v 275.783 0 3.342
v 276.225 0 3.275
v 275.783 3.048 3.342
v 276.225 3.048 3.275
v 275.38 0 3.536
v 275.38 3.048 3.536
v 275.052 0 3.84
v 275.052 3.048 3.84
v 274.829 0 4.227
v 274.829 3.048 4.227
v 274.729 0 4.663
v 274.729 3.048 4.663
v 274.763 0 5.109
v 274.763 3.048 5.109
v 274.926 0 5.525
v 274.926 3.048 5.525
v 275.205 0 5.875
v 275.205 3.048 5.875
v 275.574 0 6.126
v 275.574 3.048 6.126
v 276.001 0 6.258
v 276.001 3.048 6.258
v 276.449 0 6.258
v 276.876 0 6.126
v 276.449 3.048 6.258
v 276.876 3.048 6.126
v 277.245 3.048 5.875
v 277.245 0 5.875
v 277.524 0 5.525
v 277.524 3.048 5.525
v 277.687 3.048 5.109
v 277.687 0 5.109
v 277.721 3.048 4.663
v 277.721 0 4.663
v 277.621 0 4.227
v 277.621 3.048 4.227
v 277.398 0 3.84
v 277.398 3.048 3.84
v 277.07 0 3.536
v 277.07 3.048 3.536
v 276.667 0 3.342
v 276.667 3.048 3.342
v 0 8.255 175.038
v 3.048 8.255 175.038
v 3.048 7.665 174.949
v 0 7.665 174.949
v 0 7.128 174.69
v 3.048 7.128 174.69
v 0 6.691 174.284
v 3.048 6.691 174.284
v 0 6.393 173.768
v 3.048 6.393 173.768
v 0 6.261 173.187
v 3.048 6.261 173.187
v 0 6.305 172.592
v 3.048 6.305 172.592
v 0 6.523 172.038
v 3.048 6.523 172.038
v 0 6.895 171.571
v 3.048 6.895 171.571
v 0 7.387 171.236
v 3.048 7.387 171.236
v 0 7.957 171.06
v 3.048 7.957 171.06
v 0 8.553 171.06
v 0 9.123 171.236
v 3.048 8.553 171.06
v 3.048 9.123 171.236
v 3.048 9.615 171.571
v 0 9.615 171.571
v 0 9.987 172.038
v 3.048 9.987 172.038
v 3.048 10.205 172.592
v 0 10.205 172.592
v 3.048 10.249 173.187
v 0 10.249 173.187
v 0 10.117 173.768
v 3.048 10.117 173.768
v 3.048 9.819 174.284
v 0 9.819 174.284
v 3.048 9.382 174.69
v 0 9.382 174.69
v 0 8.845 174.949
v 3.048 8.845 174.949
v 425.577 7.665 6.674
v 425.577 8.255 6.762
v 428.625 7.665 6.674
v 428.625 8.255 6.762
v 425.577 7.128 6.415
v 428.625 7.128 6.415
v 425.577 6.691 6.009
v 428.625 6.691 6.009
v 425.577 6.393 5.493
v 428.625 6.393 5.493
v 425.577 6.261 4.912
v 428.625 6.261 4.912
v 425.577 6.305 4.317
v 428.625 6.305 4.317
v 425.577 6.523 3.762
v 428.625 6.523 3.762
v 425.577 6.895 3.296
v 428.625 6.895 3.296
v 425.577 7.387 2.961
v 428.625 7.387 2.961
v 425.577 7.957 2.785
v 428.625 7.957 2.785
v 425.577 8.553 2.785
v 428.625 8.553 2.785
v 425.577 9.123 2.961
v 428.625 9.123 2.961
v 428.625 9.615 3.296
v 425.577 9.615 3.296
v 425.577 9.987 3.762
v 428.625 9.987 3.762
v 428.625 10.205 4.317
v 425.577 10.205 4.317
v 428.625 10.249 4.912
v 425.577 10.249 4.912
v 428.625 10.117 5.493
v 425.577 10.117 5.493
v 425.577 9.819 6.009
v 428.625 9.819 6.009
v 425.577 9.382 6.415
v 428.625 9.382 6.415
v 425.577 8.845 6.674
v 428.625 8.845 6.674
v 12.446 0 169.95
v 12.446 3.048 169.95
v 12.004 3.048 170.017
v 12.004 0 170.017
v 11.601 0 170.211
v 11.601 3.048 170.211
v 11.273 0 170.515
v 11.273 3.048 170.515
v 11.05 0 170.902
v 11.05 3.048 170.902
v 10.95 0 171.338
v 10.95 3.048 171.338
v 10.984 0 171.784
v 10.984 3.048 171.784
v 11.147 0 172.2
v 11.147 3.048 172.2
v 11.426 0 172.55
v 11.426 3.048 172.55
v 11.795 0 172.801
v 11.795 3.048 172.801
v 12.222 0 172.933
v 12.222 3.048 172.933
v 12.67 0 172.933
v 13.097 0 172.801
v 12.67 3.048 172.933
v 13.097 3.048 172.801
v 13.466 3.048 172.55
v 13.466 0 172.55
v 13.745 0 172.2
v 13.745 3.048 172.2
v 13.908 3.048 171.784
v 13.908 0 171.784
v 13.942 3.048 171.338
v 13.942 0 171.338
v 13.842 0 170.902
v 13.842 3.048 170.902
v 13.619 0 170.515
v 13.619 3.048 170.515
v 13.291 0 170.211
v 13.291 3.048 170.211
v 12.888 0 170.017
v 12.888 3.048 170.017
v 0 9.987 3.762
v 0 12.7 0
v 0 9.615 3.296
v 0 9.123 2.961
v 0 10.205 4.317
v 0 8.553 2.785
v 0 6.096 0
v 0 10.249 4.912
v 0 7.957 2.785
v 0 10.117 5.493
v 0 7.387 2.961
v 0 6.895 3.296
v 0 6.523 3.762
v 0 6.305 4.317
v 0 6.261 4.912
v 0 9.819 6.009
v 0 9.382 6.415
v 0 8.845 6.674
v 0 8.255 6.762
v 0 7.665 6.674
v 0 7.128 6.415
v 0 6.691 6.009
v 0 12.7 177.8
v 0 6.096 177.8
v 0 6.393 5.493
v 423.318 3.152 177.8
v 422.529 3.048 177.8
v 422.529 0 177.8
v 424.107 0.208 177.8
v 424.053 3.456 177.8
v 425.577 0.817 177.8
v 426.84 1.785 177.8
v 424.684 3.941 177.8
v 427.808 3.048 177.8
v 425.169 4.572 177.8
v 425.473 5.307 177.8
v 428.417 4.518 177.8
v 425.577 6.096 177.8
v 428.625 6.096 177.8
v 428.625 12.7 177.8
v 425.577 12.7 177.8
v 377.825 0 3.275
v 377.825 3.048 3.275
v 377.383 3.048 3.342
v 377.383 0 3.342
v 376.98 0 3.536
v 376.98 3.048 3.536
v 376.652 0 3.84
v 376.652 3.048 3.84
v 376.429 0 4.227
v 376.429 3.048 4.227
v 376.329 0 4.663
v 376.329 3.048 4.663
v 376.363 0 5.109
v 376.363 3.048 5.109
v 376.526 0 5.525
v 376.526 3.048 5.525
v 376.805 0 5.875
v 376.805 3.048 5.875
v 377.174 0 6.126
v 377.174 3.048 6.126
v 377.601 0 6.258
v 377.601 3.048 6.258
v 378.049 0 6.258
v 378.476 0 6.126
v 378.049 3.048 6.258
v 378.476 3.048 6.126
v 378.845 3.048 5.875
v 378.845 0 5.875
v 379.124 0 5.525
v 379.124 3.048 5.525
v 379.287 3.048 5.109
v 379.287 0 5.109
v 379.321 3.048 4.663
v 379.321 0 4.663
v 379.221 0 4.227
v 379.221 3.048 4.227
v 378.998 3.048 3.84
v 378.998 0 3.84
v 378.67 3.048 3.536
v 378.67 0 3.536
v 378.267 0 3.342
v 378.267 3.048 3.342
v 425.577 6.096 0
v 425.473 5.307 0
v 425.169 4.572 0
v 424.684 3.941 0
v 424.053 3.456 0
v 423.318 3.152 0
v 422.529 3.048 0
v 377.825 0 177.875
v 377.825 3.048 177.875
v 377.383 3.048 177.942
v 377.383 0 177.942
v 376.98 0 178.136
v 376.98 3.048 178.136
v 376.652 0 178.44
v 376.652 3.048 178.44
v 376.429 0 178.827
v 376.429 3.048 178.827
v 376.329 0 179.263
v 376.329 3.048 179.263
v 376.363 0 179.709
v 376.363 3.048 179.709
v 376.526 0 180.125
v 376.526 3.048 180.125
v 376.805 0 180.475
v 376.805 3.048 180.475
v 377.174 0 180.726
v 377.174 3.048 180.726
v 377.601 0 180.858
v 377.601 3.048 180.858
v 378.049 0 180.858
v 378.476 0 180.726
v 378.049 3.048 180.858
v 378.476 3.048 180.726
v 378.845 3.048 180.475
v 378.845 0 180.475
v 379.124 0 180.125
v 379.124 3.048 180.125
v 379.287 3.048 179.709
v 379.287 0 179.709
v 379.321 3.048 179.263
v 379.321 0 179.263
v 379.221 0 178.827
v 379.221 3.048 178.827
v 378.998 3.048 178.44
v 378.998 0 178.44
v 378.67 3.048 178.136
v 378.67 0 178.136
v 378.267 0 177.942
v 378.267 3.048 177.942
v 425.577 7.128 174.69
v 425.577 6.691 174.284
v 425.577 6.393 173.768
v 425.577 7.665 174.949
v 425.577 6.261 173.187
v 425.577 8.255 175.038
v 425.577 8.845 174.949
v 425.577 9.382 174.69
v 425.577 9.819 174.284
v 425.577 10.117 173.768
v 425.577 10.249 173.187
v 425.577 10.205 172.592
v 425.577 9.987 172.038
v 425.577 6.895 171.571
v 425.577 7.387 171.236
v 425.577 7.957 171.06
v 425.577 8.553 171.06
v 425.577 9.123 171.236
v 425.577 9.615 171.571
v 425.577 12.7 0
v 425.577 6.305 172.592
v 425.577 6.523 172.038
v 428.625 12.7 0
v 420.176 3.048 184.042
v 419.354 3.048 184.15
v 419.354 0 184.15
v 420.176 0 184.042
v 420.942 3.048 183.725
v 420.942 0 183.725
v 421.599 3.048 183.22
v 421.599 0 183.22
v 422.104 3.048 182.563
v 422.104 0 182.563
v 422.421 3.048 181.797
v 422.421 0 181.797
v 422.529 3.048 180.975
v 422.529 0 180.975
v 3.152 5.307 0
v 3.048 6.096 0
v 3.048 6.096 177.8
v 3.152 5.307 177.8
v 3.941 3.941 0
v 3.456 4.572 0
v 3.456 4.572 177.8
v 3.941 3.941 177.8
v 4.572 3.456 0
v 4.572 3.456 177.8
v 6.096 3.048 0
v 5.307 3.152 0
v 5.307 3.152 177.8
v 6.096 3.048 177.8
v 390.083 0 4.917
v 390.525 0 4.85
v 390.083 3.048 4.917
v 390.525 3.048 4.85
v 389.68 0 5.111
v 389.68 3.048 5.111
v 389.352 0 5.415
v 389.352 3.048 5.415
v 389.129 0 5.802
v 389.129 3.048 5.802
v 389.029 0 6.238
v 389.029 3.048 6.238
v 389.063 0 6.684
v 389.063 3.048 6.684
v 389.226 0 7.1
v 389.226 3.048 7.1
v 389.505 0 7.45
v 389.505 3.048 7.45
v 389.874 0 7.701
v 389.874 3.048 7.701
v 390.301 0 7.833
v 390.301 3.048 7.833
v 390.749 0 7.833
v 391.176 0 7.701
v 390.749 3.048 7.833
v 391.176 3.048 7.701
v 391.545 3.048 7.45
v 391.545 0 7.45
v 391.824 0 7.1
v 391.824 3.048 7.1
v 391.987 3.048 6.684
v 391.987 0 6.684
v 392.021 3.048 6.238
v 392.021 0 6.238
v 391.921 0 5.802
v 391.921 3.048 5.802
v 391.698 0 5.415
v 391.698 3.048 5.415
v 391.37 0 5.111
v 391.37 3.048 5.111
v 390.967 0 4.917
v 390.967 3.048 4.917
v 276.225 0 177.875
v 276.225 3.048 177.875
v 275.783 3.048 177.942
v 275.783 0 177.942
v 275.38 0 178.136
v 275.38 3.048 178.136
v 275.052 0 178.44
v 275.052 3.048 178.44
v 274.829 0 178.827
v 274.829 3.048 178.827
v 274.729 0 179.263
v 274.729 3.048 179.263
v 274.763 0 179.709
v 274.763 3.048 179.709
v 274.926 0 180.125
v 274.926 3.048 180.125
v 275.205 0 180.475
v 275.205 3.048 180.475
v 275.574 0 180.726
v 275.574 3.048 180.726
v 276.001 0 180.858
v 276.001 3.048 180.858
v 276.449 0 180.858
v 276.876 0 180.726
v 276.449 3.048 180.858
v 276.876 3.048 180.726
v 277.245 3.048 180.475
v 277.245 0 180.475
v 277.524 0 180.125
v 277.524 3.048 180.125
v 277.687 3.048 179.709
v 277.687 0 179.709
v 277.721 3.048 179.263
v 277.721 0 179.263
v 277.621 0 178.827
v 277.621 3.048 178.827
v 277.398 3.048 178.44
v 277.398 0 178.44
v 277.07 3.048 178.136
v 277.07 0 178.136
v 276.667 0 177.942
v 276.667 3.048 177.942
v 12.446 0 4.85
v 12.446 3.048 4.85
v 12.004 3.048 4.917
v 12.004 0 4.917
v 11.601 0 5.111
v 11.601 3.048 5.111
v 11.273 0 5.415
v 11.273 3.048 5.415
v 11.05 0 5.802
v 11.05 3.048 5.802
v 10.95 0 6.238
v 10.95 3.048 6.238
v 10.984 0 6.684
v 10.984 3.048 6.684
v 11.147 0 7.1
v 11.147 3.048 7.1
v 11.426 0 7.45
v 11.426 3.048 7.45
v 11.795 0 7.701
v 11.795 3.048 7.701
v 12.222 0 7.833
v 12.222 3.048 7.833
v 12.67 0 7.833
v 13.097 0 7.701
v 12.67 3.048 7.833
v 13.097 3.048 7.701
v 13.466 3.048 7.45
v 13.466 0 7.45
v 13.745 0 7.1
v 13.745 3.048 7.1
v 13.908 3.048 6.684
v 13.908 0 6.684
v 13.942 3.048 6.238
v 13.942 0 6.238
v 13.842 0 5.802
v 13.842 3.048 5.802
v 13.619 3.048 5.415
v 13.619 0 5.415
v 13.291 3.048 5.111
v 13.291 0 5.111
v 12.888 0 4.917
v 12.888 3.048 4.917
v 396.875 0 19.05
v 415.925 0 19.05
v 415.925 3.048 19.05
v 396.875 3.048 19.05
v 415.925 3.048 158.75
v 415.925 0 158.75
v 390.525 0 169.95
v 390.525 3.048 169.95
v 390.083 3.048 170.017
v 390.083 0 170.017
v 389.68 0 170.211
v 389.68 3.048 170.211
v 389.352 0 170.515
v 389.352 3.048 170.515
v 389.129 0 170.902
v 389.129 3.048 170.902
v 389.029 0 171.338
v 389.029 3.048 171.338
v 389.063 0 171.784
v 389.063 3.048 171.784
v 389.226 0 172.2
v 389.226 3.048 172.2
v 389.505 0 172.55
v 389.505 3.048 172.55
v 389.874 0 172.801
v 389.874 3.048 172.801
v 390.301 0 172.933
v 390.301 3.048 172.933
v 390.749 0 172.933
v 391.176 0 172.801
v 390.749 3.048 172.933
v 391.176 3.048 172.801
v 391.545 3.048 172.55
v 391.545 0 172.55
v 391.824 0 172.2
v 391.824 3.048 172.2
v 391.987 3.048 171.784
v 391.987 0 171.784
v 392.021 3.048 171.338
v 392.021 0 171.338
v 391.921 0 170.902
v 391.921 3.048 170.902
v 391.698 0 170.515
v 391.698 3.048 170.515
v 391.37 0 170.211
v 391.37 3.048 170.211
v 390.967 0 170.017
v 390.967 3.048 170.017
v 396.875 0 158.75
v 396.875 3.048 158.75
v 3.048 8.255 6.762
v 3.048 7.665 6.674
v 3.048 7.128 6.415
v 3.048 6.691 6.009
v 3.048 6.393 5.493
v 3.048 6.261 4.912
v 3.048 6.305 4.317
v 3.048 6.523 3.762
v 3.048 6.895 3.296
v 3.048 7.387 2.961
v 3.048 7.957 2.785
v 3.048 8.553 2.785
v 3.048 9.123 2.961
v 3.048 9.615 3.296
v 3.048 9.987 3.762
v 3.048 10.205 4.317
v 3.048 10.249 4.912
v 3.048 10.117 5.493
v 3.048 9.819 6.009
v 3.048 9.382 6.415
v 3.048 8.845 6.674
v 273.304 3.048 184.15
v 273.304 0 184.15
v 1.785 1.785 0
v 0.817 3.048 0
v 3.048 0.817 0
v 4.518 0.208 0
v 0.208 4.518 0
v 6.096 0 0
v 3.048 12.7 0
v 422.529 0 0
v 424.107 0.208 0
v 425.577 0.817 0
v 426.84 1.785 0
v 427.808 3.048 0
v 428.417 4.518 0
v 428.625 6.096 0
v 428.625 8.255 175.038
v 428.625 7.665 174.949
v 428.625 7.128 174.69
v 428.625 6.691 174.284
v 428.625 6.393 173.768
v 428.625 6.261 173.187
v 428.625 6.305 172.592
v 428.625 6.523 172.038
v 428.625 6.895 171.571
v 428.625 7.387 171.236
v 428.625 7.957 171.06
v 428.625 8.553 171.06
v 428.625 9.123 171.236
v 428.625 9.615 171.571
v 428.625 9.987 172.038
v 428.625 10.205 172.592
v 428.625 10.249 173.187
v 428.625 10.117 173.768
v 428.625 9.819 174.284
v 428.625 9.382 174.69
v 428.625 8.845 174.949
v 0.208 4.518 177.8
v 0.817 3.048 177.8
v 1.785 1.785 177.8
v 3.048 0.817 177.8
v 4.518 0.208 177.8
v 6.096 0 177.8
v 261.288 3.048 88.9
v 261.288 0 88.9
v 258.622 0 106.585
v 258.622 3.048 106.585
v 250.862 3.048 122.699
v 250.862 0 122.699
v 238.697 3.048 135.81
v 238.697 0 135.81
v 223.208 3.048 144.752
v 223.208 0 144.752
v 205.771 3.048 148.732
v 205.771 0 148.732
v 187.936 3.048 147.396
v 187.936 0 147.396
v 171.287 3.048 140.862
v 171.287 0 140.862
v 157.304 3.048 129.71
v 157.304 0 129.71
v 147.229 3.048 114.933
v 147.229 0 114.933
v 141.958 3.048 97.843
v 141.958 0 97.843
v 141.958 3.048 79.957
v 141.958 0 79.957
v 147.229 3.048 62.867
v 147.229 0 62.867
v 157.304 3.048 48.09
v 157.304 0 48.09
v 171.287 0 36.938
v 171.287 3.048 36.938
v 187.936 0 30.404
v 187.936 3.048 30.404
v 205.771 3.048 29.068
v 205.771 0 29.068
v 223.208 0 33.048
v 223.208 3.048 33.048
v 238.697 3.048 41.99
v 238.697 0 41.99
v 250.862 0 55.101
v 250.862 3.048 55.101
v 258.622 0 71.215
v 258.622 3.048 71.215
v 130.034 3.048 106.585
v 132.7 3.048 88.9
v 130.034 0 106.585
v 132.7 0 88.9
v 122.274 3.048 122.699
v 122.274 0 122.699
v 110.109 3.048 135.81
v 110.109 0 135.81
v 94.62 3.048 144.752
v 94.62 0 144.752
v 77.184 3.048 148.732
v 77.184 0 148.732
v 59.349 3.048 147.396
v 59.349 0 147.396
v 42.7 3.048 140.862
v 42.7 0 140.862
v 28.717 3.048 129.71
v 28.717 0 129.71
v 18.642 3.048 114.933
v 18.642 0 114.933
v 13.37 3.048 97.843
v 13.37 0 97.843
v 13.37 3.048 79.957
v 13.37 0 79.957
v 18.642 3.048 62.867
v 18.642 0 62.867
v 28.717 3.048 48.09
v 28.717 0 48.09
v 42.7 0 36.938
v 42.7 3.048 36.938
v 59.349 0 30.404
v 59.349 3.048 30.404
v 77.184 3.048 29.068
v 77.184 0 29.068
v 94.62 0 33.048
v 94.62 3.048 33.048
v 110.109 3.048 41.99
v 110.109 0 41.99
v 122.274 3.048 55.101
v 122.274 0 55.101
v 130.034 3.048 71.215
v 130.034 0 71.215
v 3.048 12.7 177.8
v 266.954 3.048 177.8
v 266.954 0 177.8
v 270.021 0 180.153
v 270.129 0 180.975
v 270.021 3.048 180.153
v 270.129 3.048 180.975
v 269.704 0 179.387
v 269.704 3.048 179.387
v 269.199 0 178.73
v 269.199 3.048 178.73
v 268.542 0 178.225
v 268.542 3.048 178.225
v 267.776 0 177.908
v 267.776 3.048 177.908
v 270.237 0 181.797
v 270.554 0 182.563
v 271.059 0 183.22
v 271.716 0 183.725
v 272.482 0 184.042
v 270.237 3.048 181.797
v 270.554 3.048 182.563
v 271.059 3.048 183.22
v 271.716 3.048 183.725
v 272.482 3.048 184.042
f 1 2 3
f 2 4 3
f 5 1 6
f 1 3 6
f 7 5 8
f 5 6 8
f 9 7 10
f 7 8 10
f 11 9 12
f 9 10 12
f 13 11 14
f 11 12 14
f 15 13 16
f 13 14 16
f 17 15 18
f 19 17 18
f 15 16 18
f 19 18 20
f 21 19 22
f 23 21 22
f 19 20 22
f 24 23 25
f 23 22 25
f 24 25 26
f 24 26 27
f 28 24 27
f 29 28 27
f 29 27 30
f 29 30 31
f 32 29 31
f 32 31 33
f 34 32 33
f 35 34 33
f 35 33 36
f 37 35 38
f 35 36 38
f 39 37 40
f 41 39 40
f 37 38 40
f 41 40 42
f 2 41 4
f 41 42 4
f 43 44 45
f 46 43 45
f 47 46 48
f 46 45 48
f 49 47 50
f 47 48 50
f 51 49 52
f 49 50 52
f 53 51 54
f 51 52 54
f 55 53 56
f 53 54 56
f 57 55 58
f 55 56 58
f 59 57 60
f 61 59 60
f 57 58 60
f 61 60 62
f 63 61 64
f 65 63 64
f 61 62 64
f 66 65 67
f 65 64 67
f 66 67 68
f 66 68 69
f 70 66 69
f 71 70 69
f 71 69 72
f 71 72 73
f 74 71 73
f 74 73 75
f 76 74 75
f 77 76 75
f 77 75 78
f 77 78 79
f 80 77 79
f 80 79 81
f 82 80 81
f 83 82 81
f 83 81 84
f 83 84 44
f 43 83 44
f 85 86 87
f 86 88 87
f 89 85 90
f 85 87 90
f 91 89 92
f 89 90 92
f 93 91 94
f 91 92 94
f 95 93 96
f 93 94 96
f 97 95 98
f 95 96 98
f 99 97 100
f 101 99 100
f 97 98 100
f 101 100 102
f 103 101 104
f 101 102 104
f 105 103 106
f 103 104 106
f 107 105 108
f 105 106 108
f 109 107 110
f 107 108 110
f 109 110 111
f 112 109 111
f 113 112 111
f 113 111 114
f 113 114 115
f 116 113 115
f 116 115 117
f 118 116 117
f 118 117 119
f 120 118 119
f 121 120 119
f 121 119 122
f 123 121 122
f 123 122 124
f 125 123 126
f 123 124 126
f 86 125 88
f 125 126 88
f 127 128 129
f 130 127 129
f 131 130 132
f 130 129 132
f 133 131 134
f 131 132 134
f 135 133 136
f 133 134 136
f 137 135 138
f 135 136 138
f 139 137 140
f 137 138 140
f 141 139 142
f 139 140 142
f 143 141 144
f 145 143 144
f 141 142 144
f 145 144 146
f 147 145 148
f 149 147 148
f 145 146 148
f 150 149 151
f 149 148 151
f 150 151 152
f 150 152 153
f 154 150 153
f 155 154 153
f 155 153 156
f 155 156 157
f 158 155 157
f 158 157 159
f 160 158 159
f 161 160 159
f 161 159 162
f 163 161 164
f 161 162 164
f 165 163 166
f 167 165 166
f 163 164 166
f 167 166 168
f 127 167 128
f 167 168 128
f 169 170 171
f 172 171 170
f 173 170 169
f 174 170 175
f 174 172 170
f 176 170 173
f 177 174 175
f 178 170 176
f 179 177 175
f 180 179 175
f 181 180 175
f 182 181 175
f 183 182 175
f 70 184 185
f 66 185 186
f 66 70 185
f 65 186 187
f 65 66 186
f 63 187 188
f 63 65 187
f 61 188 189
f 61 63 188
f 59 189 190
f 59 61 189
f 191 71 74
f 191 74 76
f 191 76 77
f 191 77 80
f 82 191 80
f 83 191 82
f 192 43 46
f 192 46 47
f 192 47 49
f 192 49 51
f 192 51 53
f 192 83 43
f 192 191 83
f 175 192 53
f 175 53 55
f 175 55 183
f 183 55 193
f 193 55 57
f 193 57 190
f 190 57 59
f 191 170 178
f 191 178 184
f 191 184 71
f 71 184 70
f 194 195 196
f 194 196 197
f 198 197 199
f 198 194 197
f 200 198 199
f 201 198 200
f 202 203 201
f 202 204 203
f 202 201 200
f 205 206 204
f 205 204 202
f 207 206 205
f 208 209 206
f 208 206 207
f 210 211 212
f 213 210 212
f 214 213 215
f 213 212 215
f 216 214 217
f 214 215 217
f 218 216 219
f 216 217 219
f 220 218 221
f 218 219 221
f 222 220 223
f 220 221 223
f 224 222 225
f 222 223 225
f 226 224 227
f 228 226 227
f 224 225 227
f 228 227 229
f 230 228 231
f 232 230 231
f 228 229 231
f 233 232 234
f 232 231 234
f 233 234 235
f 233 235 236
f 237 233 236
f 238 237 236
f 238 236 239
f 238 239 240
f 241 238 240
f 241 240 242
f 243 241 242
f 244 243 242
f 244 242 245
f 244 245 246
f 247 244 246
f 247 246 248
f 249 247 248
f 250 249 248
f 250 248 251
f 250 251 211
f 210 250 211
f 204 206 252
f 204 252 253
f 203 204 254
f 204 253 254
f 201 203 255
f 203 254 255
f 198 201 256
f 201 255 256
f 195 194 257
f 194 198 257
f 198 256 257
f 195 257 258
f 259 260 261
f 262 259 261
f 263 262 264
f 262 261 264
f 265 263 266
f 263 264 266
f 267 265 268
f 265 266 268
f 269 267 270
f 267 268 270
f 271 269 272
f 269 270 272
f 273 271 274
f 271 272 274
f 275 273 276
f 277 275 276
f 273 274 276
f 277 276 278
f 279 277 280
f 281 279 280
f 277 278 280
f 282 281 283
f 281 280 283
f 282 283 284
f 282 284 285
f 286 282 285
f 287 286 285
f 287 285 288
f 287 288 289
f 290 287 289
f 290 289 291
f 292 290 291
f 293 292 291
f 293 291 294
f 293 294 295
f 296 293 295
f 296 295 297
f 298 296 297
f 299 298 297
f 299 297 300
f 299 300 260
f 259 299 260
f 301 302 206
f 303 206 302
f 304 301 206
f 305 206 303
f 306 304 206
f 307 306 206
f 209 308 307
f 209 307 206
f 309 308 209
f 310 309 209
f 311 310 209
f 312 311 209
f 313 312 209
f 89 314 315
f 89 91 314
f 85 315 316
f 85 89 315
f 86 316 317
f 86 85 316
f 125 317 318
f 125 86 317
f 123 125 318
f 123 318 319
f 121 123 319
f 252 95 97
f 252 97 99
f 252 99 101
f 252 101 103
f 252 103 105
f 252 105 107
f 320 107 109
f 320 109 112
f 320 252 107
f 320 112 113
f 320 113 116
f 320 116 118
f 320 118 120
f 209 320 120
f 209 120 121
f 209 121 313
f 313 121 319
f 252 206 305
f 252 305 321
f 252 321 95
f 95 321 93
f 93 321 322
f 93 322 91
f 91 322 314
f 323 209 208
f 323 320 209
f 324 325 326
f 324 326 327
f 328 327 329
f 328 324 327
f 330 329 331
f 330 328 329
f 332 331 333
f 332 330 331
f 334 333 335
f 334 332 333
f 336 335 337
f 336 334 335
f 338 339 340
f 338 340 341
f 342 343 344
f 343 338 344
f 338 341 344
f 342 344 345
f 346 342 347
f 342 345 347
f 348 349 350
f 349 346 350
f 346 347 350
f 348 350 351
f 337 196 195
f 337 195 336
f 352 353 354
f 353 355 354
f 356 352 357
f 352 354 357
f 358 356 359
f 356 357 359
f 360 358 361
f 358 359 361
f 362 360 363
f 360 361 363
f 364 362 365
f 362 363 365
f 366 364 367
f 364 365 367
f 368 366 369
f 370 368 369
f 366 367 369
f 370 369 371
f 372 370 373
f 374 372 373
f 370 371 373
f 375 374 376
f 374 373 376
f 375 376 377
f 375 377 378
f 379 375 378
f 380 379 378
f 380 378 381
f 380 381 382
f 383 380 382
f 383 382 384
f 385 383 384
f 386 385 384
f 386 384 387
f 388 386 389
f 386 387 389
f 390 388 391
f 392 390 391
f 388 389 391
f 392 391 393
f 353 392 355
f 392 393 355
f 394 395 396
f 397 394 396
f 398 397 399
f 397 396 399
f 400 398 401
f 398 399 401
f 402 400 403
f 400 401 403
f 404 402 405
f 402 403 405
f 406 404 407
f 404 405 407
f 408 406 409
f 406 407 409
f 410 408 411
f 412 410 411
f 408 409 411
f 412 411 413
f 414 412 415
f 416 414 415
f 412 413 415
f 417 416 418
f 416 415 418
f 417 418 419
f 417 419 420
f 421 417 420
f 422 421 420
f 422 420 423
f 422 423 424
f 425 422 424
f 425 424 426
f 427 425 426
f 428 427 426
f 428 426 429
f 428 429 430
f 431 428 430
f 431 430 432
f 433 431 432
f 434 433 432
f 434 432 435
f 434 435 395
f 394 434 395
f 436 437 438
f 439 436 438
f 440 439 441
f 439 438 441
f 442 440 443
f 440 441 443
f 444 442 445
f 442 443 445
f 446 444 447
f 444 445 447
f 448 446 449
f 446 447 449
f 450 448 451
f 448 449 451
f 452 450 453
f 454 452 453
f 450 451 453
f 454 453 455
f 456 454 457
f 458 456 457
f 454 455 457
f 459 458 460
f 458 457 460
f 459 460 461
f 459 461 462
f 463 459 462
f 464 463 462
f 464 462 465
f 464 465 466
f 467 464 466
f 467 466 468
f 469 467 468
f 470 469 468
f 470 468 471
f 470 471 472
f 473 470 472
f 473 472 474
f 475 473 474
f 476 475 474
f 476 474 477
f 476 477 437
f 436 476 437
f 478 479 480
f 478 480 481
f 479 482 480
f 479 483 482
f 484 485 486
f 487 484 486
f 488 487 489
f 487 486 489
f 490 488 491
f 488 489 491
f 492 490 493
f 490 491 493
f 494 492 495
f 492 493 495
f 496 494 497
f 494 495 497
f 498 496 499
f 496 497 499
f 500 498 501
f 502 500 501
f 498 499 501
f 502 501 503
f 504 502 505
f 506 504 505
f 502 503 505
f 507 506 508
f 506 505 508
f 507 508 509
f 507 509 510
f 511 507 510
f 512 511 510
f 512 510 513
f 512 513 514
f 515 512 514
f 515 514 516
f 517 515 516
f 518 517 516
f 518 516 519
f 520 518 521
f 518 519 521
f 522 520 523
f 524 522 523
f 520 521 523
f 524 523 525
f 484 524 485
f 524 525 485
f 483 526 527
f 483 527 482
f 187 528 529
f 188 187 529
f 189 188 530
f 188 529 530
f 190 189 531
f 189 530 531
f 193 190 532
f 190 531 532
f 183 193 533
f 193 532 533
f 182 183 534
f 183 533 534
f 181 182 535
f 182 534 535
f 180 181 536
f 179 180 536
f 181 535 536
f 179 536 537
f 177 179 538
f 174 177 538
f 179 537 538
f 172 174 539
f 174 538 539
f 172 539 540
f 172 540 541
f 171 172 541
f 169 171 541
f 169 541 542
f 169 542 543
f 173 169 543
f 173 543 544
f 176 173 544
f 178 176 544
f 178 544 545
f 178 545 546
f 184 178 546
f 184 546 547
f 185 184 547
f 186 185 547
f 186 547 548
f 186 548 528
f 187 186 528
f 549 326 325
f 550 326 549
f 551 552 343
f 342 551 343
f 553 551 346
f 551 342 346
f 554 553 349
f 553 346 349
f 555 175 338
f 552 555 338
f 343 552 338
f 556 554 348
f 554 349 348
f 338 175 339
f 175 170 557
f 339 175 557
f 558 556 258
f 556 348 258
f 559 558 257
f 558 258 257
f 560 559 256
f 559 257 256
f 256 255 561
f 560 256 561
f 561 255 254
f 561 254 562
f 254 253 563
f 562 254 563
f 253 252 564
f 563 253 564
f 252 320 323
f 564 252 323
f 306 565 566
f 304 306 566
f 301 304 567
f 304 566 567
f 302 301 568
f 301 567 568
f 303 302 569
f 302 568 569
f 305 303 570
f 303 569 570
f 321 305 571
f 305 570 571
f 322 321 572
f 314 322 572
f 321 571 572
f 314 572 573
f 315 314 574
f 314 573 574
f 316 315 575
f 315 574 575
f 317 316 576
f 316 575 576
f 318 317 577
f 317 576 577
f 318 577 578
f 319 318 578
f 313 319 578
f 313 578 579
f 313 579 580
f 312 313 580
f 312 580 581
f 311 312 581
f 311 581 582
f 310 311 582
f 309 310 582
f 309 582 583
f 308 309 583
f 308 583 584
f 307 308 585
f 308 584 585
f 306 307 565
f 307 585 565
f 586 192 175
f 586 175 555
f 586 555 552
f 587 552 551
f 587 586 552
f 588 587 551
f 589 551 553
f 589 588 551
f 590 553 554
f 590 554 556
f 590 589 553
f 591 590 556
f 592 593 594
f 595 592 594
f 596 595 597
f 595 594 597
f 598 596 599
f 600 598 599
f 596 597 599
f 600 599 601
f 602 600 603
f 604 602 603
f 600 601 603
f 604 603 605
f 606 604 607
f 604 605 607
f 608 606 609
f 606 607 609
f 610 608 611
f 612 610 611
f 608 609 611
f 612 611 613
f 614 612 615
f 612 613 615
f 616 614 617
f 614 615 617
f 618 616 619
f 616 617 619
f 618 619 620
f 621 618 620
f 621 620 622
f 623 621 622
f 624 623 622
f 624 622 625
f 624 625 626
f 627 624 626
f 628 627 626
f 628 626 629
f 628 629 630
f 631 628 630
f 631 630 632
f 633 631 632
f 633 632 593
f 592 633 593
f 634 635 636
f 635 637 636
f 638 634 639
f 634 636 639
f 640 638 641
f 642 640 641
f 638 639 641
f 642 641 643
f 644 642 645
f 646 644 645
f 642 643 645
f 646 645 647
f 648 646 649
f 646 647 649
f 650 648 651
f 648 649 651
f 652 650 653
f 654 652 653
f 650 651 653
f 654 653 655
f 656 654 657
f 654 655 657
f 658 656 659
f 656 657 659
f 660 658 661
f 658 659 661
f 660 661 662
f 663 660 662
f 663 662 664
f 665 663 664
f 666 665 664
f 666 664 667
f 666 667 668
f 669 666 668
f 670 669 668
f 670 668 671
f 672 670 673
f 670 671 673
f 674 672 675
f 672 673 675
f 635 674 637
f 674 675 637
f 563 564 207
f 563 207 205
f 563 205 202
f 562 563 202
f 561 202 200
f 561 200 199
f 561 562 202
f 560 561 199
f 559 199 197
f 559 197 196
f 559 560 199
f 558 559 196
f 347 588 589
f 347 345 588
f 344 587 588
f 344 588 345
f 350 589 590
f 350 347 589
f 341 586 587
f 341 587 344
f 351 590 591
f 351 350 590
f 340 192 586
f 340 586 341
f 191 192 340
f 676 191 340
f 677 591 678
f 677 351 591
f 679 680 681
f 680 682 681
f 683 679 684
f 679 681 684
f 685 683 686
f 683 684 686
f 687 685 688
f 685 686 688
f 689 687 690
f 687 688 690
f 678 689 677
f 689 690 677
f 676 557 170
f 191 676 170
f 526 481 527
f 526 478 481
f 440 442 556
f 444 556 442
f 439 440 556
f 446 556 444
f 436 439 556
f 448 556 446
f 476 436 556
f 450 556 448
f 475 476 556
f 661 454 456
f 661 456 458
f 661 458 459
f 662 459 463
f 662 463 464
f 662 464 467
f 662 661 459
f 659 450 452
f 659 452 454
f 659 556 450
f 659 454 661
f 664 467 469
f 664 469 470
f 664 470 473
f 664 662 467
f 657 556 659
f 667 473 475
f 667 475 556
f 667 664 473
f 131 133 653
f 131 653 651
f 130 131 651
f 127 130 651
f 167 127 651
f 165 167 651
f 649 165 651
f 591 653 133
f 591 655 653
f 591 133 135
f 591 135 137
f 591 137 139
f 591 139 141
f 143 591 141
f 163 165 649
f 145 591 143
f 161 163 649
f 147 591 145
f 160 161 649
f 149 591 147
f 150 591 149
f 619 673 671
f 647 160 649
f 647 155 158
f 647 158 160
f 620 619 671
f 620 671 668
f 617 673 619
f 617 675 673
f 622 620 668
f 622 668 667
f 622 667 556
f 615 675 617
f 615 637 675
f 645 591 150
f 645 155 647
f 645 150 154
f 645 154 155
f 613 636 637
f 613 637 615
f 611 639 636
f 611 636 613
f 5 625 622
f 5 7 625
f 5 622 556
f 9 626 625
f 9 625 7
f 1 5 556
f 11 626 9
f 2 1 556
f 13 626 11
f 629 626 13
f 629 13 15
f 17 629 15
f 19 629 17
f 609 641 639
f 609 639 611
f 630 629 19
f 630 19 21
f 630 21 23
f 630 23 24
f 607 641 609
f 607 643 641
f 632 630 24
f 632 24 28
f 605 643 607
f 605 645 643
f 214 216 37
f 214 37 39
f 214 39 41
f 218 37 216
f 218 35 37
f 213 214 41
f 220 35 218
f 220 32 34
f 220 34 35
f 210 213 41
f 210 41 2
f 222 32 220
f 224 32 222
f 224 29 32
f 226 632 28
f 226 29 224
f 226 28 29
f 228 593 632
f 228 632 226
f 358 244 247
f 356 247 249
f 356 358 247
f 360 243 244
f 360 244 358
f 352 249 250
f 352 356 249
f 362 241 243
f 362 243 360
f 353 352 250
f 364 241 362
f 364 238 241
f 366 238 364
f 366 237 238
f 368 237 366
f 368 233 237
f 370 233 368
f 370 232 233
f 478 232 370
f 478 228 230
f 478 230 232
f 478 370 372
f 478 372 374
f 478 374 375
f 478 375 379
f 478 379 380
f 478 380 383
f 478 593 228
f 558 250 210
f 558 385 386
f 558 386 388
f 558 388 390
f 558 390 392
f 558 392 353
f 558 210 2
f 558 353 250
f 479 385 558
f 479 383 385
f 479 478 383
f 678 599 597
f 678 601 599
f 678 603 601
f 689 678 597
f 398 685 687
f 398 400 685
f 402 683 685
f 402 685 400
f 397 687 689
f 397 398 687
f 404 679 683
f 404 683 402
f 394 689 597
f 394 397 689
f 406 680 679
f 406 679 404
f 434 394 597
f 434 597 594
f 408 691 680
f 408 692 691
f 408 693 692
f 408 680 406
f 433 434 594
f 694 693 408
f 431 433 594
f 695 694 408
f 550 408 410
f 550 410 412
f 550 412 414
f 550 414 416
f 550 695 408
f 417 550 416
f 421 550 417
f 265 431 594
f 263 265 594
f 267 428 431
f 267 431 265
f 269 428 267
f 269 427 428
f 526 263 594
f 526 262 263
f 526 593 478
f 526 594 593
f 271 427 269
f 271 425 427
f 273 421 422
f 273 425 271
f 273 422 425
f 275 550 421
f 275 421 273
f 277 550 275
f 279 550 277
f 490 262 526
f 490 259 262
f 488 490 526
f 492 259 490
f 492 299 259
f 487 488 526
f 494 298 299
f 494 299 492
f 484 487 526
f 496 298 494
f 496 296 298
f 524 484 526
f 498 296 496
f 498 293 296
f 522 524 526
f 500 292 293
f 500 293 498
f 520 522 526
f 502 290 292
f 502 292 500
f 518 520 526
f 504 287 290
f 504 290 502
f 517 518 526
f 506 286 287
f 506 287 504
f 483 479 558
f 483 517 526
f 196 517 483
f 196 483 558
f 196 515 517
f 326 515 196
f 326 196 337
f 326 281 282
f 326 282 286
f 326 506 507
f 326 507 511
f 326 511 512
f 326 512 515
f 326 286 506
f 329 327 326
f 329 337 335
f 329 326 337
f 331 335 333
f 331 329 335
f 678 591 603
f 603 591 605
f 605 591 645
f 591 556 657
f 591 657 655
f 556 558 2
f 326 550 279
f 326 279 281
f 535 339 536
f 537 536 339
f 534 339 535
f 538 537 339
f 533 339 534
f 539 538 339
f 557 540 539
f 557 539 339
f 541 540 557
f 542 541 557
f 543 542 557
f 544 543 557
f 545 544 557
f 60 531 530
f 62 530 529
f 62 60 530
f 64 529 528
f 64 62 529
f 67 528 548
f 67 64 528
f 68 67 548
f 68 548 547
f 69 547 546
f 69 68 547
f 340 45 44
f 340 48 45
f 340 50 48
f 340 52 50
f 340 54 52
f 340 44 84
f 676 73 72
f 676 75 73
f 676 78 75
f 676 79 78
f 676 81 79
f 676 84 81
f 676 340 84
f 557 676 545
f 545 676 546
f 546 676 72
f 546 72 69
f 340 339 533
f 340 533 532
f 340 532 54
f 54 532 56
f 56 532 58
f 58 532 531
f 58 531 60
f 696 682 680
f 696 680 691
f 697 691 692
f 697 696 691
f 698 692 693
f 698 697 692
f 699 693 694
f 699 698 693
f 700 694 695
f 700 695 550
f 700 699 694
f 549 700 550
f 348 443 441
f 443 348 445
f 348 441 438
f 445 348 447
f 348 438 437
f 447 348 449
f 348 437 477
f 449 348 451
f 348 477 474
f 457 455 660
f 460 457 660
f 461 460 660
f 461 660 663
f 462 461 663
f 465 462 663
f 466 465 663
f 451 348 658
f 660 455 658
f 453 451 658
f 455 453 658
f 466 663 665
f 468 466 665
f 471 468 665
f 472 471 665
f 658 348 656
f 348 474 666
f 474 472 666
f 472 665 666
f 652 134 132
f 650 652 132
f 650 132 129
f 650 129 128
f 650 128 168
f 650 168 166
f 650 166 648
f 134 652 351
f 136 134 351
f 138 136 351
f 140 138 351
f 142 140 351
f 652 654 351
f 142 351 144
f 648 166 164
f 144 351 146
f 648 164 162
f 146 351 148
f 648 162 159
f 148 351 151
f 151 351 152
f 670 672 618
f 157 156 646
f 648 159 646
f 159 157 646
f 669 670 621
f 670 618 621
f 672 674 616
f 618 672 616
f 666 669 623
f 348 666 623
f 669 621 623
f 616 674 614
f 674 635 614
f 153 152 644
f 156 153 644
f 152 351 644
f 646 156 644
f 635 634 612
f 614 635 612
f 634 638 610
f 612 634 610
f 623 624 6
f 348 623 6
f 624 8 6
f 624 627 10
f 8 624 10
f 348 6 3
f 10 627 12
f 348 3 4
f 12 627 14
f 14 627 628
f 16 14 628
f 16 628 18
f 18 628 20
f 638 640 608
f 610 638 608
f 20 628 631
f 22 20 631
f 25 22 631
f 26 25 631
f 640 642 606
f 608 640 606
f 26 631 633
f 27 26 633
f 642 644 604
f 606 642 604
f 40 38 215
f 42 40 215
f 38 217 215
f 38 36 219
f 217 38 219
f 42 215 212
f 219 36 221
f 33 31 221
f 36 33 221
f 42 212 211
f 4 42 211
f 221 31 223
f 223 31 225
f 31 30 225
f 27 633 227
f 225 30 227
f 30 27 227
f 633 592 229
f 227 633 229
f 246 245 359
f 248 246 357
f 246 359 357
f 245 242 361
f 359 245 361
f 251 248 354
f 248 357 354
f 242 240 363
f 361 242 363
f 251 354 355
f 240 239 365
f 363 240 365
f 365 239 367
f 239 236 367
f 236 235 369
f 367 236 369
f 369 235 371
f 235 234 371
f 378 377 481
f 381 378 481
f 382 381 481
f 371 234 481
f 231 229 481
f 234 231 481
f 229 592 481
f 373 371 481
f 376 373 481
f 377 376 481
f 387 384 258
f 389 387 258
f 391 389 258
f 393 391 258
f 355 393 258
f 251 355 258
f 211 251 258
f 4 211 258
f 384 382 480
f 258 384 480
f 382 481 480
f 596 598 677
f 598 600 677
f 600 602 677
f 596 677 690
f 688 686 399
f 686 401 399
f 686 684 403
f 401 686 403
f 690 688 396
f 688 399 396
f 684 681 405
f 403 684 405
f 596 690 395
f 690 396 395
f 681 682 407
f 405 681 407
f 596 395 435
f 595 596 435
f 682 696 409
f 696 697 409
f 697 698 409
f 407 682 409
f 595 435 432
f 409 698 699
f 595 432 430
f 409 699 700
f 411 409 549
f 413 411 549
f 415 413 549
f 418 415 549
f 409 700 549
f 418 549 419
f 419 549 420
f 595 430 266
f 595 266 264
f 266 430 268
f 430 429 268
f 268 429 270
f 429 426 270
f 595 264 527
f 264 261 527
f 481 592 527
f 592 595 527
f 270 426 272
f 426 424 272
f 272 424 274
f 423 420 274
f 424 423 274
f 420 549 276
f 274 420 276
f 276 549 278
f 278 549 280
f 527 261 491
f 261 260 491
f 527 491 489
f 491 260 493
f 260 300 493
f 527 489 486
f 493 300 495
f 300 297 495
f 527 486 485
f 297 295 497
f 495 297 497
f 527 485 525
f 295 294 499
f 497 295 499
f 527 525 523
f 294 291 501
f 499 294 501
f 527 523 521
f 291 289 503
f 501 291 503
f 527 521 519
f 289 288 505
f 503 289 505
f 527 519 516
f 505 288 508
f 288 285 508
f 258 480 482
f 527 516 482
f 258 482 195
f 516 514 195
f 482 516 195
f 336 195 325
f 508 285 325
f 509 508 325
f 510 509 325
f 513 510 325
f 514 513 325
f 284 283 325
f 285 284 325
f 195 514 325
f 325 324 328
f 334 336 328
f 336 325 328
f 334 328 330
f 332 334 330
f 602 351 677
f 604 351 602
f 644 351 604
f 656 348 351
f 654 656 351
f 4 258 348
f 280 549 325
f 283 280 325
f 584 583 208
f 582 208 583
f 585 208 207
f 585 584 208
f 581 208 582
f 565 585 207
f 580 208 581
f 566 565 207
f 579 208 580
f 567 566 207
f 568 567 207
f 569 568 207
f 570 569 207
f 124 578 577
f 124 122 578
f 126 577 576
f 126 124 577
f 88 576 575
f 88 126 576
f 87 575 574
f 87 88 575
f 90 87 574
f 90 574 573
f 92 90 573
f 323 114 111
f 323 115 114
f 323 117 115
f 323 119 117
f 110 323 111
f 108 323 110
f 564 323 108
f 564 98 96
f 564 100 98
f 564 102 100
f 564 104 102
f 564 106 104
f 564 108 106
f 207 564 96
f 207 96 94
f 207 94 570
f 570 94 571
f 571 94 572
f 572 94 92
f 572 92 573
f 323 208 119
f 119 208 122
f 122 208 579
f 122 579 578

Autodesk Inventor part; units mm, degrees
ref_plane "YZ Plane" through (0, 0, 0) normal (1, 0, 0) x (0, 1, 0)
ref_plane "XZ Plane" through (0, 0, 0) normal (0, 1, 0) x (-1, 0, 0)
ref_plane "XY Plane" through (0, 0, 0) normal (0, 0, 1) x (1, 0, 0)
sketch "Sketch1" plane through (0, 0, 0) normal (0, 1, 0) x (-1, 0, 0)
  line L0 (0, 0) -> (-428.625, 0)
  line L1 (-428.625, 0) -> (-428.625, 177.8)
  line L2 (-428.625, 177.8) -> (0, 177.8)
  line L3 (0, 177.8) -> (0, 0)
  dimension "d0" = 428.625
  dimension "d1" = 177.8
extrude "Plate1" add sketch "Sketch1" along normal blind 3.048
sketch "Sketch2" plane through (3.048, 0, 177.8) normal (-1, 0, 0) x (0, -1, 0)
  line L0 (0, -177.8) -> (0, 0)
  line L1 (0, 0) -> (-12.7, 0)
  line L2 (-12.7, 0) -> (-12.7, -177.8)
  line L3 (-12.7, -177.8) -> (0, -177.8)
edge flange "Flange1" height 12.7 angle 90 thickness 3.048 bend radius 3.048 thickness toward (-1, 0, 0) relief straight relief width 3.048 relief depth 1.524 corner gap 3.048 corner form 0 edges at (0, 3.048, 88.9) (428.625, 3.048, 88.9) wall of the first edge with corners at (3.048, 0, 0) (3.048, 0, 177.8) (3.048, 12.7, 177.8) (3.048, 12.7, 0)
bend "Bend1"
corner "Corner1"
sketch "Sketch3" plane through (0, 12.7, 0) normal (-1, 0, 0) x (0, 0, 1)
  line L0 (0, -6.604) -> (0, 0) projected
  line L1 (0, 0) -> (177.8, 0) projected
  line L2 (177.8, -12.7) -> (0, -12.7) projected
  line L3 (177.8, 0) -> (177.8, -6.604) projected
  line L4 (4.7625, -4.445) -> (173.0375, -4.445) construction
  line L5 (88.9, 0) -> (88.9, -12.7) construction
  dimension "d13" = 168.275
  dimension "d14" = 4.445
hole "Hole1" at (0, 8.255, 4.7625) at (0, 8.255, 173.0375) direction (1, 0, 0) diameter 4 end through all
sketch "Sketch4" plane through (0, 0, 0) normal (0, -1, 0) x (1, 0, 0)
  line L0 (428.625, 177.8) -> (428.625, 0) projected
  line L1 (0, 0) -> (0, 177.8) projected
  line L2 (422.529, 177.8) -> (6.096, 177.8) projected
  line L3 (6.096, 0) -> (422.529, 0) projected
  line L4 (422.529, 0) -> (422.529, 177.8) projected
  line L5 (396.875, 158.75) -> (415.925, 158.75)
  line L6 (415.925, 158.75) -> (415.925, 19.05)
  line L7 (415.925, 19.05) -> (396.875, 19.05)
  line L8 (396.875, 19.05) -> (396.875, 158.75)
  dimension "d22" = 31.75
  dimension "d23" = 19.05
  dimension "d24" = 19.05
  dimension "d25" = 19.05
extrude "Cut1" cut sketch "Sketch4" against normal blind 3.048
sketch "Sketch5" plane through (0, 0, 0) normal (0, -1, 0) x (1, 0, 0)
  line L0 (422.529, 177.8) -> (6.096, 177.8) projected
  line L1 (6.096, 177.8) -> (6.096, 0) construction
  line L2 (6.096, 0) -> (422.529, 0) projected
  line L3 (422.529, 0) -> (422.529, 177.8) projected
  line L4 (12.446, 171.45) -> (390.525, 171.45) construction
  line L5 (390.525, 171.45) -> (390.525, 6.35) construction
  line L6 (390.525, 6.35) -> (12.446, 6.35) construction
  line L7 (12.446, 6.35) -> (12.446, 171.45) construction
  line L8 (396.875, 19.05) -> (396.875, 158.75) projected
  point P0 (0, 0)
  dimension "d28" = 6.35
  dimension "d29" = 6.35
  dimension "d30" = 6.35
  dimension "d31" = 6.35
hole "Hole2" at (12.446, 0, 171.45) at (12.446, 0, 6.35) at (390.525, 0, 6.35) at (390.525, 0, 171.45) direction (0, 1, 0) diameter 3 end through all
sketch "Sketch6" plane through (0, 0, 0) normal (0, -1, 0) x (1, 0, 0)
  line L0 (422.529, 177.8) -> (6.096, 177.8) projected
  line L1 (6.096, 177.8) -> (6.096, 0) projected
  line L2 (422.529, 0) -> (422.529, 177.8) projected
  line L3 (6.096, 0) -> (422.529, 0) projected
  circle A0 centre (72.7, 88.9) radius 60
  circle A1 centre (201.2875, 88.9) radius 60
  circle A2 centre (329.875, 88.9) radius 60
  line L4 (72.7, 88.9) -> (329.875, 88.9) construction
  line L5 (12.7, 177.8) -> (12.7, 0) construction
  line L6 (0, 0) -> (0, 177.8) projected
  dimension "d39" = 120
  dimension "d40" = 120
  dimension "d41" = 120
  dimension "d42" = 257.175
  dimension "d43" = 128.5875
  dimension "d44" = 177.8
  dimension "d45" = 88.9
  dimension "d46" = 12.7
extrude "Cut2" cut sketch "Sketch6" against normal blind 3.048 contours A0 | A1
sketch "Sketch8" plane through (0, 0, 0) normal (0, -1, 0) x (1, 0, 0)
  line L0 (422.529, 177.8) -> (6.096, 177.8)
  line L1 (422.529, 177.8) -> (6.096, 177.8)
  line L2 (270.129, 177.8) -> (422.529, 177.8)
  line L3 (422.529, 177.8) -> (422.529, 184.15)
  line L4 (422.529, 184.15) -> (270.129, 184.15)
  line L5 (270.129, 184.15) -> (270.129, 177.8)
  point P0 (0, 0)
  dimension "d55" = 6.35
  dimension "d56" = 152.4
sheet face with bend "Face2" sketch "Sketch8" thickness 3.048 toward (0, 1, 0) bend radius 3.048
bend "Bend2"
sketch "Sketch7" plane through (0, 0, 0) normal (0, -1, 0) x (1, 0, 0)
  line L0 (422.529, 177.8) -> (6.096, 177.8) construction
  line L1 (6.096, 0) -> (422.529, 0) construction
  line L2 (396.875, 19.05) -> (396.875, 158.75) construction
  line L3 (276.225, 179.375) -> (377.825, 179.375) construction
  line L4 (377.825, 179.375) -> (377.825, 4.775) construction
  line L5 (377.825, 4.775) -> (276.225, 4.775) construction
  line L6 (276.225, 4.775) -> (276.225, 179.375) construction
  line L7 (276.225, 92.075) -> (377.825, 92.075) construction
  point P0 (0, 0)
  dimension "d49" = 101.6
  dimension "d50" = 174.6
  dimension "d51" = 177.8
  dimension "d52" = 85.725
  dimension "d53" = 19.05
hole "Hole3" at (276.225, 0, 179.375) at (377.825, 0, 179.375) at (377.825, 0, 4.775) at (276.225, 0, 4.775) at (276.225, 0, 179.375) direction (0, 1, 0) diameter 3 end through all
fillet "Corner Round1" radius 3.175 3 edges at (270.129, 1.524, 184.15) (270.129, 1.524, 177.8) (422.529, 1.524, 184.15)
equation "\"d20\" = Thickness"
equation "\"d25\" = d24"
equation "\"d26\" = Thickness"
equation "\"d29\" = d28"
equation "\"d30\" = d28"
equation "\"d31\" = d28"
equation "\"d37\" = Thickness"
equation "\"d43\" = 0.5 * d42"
equation "\"d45\" = 0.5 * d44"
equation "\"d47\" = Thickness"
equation "\"d67\" = Thickness"
equation "\"d2\" = Thickness"
equation "\"d3\" = BendReliefWidth"
equation "\"d4\" = BendReliefDepth"
equation "\"d5\" = MinimumRemnant"
equation "\"d6\" = TransitionRadius"
equation "\"d9\" = BendRadius"
equation "\"d10\" = CornerReliefSize"
equation "\"d11\" = GapSize"
equation "\"d12\" = JacobiRadiusSize"
equation "\"d57\" = BendRadius"
equation "\"d58\" = BendReliefWidth"
equation "\"d60\" = MinimumRemnant"
equation "\"d59\" = BendReliefDepth"
equation "\"d61\" = TransitionRadius"
equation "\"BendRadius\" = Thickness"
equation "\"BendReliefWidth\" = Thickness"
equation "\"BendReliefDepth\" = 0.5 * Thickness"
equation "\"CornerReliefSize\" = 4 * Thickness"
equation "\"MinimumRemnant\" = 2 * Thickness"
equation "\"TransitionRadius\" = BendRadius"
equation "\"JacobiRadiusSize\" = Thickness"
equation "\"GapSize\" = Thickness"
equation "\"Thickness\" = 3.048"
properties part number "Plate"
